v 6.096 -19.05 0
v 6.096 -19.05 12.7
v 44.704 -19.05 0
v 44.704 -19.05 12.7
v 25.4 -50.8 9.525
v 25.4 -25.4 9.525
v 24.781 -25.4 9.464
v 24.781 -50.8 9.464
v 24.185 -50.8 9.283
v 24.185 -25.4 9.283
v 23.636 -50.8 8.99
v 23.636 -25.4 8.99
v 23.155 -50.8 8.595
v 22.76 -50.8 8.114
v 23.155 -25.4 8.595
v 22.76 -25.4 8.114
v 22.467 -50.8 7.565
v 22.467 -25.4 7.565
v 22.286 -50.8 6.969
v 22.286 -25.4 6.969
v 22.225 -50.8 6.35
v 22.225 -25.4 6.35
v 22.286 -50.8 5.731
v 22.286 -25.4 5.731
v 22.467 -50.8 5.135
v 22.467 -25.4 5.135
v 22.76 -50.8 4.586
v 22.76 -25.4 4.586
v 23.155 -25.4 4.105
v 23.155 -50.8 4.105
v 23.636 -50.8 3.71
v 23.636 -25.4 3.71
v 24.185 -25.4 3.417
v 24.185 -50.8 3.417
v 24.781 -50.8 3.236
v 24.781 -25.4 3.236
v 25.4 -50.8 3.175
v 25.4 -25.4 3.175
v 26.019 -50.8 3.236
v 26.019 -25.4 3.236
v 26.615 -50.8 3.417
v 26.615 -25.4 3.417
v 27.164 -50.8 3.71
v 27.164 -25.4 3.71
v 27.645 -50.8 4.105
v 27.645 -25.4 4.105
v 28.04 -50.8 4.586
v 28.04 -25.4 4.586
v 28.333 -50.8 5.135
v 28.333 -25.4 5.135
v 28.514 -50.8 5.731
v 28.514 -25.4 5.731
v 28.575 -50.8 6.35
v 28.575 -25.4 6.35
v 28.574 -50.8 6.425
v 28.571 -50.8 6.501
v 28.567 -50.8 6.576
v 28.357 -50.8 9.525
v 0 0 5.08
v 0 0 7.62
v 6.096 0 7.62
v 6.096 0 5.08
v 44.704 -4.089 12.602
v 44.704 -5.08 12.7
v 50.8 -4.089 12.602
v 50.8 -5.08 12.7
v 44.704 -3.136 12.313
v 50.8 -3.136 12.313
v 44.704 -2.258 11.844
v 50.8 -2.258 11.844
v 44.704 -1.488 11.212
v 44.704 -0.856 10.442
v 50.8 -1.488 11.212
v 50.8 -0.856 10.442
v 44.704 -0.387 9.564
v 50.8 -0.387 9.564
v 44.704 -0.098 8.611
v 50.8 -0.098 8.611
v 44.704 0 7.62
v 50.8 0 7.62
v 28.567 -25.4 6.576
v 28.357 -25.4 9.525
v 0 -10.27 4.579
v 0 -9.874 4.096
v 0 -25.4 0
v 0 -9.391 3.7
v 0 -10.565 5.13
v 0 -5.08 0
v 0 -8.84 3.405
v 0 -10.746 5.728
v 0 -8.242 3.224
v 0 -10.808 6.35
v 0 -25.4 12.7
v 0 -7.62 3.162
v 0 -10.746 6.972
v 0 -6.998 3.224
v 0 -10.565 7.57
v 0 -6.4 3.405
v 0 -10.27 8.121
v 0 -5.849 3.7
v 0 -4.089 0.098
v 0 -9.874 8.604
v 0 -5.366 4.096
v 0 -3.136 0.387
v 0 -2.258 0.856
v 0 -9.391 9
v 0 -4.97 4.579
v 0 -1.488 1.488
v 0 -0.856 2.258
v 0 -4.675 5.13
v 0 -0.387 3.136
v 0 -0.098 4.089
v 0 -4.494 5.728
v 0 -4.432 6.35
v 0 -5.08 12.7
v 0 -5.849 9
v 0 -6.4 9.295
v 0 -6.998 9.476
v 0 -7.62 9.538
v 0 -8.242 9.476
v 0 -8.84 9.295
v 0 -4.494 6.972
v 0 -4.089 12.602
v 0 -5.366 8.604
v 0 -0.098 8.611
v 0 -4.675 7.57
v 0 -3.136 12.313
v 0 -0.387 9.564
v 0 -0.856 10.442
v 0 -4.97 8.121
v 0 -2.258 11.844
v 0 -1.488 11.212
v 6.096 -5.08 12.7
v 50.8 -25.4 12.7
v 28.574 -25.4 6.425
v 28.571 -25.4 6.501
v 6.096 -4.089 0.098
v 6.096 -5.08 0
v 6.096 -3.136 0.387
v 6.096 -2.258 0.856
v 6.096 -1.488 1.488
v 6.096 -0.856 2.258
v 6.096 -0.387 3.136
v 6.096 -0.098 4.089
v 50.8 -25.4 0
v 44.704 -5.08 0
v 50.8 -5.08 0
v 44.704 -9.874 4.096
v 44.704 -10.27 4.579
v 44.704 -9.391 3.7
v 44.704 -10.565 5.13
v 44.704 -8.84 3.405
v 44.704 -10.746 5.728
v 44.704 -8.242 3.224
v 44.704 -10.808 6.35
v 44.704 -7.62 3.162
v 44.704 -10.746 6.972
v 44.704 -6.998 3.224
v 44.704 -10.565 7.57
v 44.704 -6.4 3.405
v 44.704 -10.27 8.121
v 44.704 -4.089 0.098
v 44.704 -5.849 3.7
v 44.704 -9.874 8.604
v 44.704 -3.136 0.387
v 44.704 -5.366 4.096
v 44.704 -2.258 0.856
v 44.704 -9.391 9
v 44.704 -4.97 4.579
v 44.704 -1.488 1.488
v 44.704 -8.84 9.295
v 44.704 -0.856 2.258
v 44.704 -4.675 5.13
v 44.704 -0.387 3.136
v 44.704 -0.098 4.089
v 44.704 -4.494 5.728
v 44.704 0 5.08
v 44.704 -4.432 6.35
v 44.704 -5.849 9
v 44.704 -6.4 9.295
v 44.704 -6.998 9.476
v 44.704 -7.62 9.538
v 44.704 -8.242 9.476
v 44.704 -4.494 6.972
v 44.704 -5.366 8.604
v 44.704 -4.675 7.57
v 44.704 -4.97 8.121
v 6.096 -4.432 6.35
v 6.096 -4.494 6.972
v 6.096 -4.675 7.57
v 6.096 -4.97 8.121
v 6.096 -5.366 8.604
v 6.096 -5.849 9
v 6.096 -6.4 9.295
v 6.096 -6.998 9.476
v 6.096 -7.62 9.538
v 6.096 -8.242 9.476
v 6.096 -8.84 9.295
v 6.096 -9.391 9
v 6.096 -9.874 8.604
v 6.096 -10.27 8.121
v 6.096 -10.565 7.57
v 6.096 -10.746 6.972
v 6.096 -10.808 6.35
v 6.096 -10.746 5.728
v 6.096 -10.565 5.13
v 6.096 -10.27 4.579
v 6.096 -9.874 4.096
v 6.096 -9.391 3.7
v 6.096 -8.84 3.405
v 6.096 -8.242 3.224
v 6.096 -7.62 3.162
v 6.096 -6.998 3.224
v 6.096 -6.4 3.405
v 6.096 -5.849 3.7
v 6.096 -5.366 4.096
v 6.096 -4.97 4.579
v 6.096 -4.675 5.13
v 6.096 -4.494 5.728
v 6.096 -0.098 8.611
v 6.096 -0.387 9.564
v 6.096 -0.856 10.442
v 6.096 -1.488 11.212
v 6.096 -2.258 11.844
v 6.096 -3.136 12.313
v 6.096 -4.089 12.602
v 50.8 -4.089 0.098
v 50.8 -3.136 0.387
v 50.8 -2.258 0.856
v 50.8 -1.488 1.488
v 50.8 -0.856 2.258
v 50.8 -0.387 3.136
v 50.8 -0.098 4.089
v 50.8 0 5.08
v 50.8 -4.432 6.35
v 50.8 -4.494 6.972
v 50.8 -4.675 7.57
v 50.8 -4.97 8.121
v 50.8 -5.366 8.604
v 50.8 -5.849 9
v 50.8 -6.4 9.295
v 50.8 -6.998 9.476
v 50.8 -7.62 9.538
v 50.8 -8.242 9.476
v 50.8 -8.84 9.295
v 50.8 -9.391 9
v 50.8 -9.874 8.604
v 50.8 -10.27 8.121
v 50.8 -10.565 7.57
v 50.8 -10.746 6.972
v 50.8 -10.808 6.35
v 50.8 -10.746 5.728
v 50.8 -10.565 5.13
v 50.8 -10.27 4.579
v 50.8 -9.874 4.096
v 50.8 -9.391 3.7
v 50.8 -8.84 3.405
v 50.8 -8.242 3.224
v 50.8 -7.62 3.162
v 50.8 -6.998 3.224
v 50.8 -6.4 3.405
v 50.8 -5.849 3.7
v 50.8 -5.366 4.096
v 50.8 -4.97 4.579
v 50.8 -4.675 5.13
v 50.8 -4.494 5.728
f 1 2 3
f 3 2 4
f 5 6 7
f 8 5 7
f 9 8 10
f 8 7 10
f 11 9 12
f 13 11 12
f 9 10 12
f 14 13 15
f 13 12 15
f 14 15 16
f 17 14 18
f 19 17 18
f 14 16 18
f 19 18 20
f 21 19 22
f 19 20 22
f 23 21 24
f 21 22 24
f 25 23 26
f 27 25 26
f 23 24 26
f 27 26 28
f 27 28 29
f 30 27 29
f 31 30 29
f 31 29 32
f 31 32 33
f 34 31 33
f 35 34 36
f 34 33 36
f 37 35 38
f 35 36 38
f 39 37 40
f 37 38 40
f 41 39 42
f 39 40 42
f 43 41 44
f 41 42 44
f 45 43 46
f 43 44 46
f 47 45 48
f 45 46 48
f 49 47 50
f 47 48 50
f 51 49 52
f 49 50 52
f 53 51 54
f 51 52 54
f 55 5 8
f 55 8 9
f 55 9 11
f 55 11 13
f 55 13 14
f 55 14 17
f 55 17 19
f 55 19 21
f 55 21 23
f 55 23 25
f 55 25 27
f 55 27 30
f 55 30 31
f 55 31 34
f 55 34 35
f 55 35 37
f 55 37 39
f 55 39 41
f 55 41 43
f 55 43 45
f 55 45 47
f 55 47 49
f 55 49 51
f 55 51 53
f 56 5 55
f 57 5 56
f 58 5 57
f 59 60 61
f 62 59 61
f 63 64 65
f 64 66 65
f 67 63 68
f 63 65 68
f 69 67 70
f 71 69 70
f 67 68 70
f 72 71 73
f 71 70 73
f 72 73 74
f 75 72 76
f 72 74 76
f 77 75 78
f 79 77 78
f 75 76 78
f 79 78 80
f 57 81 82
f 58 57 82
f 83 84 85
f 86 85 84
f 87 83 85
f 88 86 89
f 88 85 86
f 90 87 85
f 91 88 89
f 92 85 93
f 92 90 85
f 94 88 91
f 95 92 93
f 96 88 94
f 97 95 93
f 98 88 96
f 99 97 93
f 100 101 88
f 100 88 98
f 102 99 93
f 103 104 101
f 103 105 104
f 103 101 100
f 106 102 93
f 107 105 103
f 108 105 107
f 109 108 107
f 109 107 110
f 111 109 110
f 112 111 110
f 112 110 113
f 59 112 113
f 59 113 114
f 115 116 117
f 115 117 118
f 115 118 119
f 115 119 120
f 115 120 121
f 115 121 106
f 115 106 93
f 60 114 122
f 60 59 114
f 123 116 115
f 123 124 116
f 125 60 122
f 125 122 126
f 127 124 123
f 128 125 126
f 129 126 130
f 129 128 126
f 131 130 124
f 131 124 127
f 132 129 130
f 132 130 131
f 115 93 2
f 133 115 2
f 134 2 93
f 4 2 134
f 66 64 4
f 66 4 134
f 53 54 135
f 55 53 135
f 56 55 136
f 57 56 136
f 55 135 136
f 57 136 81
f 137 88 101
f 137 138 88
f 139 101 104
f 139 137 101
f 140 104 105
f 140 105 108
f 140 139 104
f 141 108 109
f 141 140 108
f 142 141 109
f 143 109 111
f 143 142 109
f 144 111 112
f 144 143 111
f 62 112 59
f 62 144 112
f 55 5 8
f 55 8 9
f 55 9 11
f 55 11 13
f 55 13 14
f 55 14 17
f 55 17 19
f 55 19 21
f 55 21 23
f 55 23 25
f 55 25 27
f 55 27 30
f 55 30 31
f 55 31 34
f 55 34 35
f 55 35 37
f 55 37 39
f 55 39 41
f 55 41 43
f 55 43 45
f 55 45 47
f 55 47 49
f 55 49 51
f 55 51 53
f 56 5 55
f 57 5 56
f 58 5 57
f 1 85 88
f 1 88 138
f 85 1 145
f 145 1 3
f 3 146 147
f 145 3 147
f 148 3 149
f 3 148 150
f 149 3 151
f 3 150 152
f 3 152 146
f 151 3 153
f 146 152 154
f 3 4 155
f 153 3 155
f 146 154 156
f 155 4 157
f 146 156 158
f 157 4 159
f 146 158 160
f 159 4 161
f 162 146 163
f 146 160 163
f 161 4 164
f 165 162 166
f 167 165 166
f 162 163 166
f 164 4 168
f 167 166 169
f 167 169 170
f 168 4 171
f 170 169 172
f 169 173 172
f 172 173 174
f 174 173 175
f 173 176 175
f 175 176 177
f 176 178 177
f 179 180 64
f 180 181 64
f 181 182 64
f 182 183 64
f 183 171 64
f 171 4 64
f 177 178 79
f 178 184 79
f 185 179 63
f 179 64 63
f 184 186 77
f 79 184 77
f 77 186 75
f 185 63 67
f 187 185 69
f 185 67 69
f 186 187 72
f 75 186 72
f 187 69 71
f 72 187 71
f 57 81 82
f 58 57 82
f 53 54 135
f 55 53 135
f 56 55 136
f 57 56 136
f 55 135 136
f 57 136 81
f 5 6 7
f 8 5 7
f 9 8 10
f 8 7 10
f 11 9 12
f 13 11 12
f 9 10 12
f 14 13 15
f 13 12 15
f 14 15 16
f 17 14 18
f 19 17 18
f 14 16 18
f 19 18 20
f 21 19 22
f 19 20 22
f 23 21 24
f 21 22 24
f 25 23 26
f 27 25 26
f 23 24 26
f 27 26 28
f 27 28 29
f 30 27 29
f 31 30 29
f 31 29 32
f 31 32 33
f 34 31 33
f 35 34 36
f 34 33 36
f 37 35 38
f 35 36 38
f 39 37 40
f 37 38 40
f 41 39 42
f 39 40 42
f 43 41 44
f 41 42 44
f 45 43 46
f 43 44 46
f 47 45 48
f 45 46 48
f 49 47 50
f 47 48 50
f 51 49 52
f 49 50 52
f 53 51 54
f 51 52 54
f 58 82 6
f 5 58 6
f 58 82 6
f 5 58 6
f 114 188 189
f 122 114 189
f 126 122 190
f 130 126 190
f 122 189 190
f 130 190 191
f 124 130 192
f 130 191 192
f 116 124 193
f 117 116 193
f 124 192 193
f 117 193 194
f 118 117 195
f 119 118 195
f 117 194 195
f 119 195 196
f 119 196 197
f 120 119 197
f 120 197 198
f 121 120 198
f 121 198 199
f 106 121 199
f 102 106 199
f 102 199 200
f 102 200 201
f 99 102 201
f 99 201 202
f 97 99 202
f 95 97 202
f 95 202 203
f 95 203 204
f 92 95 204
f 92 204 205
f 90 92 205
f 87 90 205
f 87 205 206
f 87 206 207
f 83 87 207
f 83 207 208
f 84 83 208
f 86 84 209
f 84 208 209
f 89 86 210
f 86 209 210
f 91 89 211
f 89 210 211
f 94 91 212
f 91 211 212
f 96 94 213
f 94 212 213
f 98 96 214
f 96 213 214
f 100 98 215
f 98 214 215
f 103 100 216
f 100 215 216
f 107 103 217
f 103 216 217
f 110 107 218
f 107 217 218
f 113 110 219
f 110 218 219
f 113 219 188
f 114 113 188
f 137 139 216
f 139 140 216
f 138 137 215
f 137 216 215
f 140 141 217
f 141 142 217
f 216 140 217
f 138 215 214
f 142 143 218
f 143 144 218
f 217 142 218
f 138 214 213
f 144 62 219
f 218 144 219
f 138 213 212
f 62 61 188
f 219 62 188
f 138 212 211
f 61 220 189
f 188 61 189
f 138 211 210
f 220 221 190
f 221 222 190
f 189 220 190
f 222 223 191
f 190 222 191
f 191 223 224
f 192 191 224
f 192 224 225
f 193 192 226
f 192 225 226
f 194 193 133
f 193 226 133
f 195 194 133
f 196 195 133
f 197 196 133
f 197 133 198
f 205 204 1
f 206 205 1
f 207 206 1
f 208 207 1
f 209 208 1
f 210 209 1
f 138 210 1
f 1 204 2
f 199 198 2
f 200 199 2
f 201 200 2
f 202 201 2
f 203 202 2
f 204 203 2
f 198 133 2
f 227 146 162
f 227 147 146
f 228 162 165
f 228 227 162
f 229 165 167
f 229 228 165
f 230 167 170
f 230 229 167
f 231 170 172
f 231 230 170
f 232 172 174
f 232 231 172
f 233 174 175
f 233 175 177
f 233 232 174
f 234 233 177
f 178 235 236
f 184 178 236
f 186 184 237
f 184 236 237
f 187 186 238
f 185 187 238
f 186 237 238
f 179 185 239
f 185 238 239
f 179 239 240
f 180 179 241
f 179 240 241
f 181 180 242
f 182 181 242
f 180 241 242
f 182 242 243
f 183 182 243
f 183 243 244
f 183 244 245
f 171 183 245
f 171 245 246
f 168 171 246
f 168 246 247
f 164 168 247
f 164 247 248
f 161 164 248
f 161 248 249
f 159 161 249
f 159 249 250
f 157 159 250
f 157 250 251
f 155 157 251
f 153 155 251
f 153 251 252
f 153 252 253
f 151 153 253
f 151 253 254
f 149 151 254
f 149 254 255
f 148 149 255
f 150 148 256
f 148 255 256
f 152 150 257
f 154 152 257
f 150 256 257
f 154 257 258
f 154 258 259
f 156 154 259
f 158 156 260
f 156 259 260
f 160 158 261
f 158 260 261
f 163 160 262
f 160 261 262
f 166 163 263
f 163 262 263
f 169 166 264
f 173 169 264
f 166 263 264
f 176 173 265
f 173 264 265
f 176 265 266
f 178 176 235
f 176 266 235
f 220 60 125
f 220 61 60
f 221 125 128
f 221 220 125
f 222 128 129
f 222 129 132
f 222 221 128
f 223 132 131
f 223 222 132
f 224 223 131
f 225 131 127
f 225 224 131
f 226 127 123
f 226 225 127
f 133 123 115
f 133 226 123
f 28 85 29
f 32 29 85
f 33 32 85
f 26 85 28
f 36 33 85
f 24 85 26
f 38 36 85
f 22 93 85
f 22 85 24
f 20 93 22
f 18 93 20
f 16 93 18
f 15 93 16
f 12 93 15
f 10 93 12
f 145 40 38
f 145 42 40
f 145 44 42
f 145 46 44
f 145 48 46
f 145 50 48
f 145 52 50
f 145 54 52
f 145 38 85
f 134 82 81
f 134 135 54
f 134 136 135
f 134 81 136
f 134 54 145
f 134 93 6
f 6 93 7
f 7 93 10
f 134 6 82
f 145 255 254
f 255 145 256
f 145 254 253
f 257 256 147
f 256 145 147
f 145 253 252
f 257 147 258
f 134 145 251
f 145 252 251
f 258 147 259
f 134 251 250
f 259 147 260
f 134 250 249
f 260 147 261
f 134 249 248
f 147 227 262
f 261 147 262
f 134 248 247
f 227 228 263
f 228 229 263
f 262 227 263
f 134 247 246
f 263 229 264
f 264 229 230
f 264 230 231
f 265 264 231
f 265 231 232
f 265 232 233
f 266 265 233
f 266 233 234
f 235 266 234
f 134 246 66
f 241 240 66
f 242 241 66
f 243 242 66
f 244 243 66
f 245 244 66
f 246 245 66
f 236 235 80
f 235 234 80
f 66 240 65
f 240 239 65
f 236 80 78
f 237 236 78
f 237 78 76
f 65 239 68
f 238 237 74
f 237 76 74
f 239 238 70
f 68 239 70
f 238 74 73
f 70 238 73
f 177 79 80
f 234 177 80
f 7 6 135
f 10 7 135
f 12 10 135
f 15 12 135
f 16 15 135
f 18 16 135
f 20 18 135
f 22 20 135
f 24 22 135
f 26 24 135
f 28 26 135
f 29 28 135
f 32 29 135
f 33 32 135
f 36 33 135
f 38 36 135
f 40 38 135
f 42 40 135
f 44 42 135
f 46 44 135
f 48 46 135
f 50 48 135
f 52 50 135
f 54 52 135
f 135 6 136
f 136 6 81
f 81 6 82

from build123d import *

# Parameters (mm, degrees)
F0_W     = 50.8
F0_H     = 12.7
F1_DEPTH = 25.4
F3_DEPTH = 25.4
F5_DEPTH = 25.4
F6_DEPTH = 25.4
F7_R     = 3.1877
F8_DEPTH = 76.2
F9_R     = 5.08


with BuildPart() as f1:
    # F0 (on Front) → F1 (new body)
    with BuildSketch(Plane.XZ):
        with Locations((25.4, 6.35)):
            Rectangle(F0_W, F0_H)
    extrude(amount=F1_DEPTH)

    # F2 (on face) → F3 (cut)
    with BuildSketch(Plane.XY.offset(12.7)):
        Polygon((6.096, 0), (6.096, -19.05), (44.704, -19.05), (44.704, 0), (6.35, 0), align=None)
    extrude(amount=-F3_DEPTH, mode=Mode.SUBTRACT)

    # F4 (on face) → F5 (join)
    with BuildSketch(Plane.XZ.offset(25.4)):
        with BuildLine():
            ThreePointArc((28.566967, 6.575717), (27.56379, 8.673497), (25.4, 9.525))
            ThreePointArc((25.4, 9.525), (23.154936, 4.104936), (28.575, 6.35))
            ThreePointArc((28.575, 6.35), (28.572991, 6.46293), (28.566967, 6.575717))
        make_face()
        with BuildLine():
            Line((28.356764, 9.525), (25.4, 9.525))
            ThreePointArc((25.4, 9.525), (27.56379, 8.673497), (28.566967, 6.575717))
            Line((28.566967, 6.575717), (28.356764, 9.525))
        make_face()
    extrude(amount=F5_DEPTH)

    # F7 (on face) → F8 (cut)
    with BuildSketch(Plane.YZ.offset(50.8)):
        with Locations((-7.62, 6.35)):
            Circle(F7_R)
    extrude(amount=-F8_DEPTH, mode=Mode.SUBTRACT)

    # F9
    f9_edges = [f1.edges().sort_by_distance(p)[0] for p in [
        (47.752, 0, 12.7),
        (3.048, 0, 12.7),
        (3.048, 0, 0),
        (47.752, 0, 0),
    ]]
    fillet(f9_edges, radius=F9_R)


with BuildPart() as f6:
    # F4 (on face) → F6 (new body)
    with BuildSketch(Plane.XZ.offset(25.4)):
        with BuildLine():
            ThreePointArc((28.566967, 6.575717), (27.56379, 8.673497), (25.4, 9.525))
            ThreePointArc((25.4, 9.525), (23.154936, 4.104936), (28.575, 6.35))
            ThreePointArc((28.575, 6.35), (28.572991, 6.46293), (28.566967, 6.575717))
        make_face()
        with BuildLine():
            Line((28.356764, 9.525), (25.4, 9.525))
            ThreePointArc((25.4, 9.525), (27.56379, 8.673497), (28.566967, 6.575717))
            Line((28.566967, 6.575717), (28.356764, 9.525))
        make_face()
    extrude(amount=F6_DEPTH)


solid = Compound([f1.part, f6.part])
